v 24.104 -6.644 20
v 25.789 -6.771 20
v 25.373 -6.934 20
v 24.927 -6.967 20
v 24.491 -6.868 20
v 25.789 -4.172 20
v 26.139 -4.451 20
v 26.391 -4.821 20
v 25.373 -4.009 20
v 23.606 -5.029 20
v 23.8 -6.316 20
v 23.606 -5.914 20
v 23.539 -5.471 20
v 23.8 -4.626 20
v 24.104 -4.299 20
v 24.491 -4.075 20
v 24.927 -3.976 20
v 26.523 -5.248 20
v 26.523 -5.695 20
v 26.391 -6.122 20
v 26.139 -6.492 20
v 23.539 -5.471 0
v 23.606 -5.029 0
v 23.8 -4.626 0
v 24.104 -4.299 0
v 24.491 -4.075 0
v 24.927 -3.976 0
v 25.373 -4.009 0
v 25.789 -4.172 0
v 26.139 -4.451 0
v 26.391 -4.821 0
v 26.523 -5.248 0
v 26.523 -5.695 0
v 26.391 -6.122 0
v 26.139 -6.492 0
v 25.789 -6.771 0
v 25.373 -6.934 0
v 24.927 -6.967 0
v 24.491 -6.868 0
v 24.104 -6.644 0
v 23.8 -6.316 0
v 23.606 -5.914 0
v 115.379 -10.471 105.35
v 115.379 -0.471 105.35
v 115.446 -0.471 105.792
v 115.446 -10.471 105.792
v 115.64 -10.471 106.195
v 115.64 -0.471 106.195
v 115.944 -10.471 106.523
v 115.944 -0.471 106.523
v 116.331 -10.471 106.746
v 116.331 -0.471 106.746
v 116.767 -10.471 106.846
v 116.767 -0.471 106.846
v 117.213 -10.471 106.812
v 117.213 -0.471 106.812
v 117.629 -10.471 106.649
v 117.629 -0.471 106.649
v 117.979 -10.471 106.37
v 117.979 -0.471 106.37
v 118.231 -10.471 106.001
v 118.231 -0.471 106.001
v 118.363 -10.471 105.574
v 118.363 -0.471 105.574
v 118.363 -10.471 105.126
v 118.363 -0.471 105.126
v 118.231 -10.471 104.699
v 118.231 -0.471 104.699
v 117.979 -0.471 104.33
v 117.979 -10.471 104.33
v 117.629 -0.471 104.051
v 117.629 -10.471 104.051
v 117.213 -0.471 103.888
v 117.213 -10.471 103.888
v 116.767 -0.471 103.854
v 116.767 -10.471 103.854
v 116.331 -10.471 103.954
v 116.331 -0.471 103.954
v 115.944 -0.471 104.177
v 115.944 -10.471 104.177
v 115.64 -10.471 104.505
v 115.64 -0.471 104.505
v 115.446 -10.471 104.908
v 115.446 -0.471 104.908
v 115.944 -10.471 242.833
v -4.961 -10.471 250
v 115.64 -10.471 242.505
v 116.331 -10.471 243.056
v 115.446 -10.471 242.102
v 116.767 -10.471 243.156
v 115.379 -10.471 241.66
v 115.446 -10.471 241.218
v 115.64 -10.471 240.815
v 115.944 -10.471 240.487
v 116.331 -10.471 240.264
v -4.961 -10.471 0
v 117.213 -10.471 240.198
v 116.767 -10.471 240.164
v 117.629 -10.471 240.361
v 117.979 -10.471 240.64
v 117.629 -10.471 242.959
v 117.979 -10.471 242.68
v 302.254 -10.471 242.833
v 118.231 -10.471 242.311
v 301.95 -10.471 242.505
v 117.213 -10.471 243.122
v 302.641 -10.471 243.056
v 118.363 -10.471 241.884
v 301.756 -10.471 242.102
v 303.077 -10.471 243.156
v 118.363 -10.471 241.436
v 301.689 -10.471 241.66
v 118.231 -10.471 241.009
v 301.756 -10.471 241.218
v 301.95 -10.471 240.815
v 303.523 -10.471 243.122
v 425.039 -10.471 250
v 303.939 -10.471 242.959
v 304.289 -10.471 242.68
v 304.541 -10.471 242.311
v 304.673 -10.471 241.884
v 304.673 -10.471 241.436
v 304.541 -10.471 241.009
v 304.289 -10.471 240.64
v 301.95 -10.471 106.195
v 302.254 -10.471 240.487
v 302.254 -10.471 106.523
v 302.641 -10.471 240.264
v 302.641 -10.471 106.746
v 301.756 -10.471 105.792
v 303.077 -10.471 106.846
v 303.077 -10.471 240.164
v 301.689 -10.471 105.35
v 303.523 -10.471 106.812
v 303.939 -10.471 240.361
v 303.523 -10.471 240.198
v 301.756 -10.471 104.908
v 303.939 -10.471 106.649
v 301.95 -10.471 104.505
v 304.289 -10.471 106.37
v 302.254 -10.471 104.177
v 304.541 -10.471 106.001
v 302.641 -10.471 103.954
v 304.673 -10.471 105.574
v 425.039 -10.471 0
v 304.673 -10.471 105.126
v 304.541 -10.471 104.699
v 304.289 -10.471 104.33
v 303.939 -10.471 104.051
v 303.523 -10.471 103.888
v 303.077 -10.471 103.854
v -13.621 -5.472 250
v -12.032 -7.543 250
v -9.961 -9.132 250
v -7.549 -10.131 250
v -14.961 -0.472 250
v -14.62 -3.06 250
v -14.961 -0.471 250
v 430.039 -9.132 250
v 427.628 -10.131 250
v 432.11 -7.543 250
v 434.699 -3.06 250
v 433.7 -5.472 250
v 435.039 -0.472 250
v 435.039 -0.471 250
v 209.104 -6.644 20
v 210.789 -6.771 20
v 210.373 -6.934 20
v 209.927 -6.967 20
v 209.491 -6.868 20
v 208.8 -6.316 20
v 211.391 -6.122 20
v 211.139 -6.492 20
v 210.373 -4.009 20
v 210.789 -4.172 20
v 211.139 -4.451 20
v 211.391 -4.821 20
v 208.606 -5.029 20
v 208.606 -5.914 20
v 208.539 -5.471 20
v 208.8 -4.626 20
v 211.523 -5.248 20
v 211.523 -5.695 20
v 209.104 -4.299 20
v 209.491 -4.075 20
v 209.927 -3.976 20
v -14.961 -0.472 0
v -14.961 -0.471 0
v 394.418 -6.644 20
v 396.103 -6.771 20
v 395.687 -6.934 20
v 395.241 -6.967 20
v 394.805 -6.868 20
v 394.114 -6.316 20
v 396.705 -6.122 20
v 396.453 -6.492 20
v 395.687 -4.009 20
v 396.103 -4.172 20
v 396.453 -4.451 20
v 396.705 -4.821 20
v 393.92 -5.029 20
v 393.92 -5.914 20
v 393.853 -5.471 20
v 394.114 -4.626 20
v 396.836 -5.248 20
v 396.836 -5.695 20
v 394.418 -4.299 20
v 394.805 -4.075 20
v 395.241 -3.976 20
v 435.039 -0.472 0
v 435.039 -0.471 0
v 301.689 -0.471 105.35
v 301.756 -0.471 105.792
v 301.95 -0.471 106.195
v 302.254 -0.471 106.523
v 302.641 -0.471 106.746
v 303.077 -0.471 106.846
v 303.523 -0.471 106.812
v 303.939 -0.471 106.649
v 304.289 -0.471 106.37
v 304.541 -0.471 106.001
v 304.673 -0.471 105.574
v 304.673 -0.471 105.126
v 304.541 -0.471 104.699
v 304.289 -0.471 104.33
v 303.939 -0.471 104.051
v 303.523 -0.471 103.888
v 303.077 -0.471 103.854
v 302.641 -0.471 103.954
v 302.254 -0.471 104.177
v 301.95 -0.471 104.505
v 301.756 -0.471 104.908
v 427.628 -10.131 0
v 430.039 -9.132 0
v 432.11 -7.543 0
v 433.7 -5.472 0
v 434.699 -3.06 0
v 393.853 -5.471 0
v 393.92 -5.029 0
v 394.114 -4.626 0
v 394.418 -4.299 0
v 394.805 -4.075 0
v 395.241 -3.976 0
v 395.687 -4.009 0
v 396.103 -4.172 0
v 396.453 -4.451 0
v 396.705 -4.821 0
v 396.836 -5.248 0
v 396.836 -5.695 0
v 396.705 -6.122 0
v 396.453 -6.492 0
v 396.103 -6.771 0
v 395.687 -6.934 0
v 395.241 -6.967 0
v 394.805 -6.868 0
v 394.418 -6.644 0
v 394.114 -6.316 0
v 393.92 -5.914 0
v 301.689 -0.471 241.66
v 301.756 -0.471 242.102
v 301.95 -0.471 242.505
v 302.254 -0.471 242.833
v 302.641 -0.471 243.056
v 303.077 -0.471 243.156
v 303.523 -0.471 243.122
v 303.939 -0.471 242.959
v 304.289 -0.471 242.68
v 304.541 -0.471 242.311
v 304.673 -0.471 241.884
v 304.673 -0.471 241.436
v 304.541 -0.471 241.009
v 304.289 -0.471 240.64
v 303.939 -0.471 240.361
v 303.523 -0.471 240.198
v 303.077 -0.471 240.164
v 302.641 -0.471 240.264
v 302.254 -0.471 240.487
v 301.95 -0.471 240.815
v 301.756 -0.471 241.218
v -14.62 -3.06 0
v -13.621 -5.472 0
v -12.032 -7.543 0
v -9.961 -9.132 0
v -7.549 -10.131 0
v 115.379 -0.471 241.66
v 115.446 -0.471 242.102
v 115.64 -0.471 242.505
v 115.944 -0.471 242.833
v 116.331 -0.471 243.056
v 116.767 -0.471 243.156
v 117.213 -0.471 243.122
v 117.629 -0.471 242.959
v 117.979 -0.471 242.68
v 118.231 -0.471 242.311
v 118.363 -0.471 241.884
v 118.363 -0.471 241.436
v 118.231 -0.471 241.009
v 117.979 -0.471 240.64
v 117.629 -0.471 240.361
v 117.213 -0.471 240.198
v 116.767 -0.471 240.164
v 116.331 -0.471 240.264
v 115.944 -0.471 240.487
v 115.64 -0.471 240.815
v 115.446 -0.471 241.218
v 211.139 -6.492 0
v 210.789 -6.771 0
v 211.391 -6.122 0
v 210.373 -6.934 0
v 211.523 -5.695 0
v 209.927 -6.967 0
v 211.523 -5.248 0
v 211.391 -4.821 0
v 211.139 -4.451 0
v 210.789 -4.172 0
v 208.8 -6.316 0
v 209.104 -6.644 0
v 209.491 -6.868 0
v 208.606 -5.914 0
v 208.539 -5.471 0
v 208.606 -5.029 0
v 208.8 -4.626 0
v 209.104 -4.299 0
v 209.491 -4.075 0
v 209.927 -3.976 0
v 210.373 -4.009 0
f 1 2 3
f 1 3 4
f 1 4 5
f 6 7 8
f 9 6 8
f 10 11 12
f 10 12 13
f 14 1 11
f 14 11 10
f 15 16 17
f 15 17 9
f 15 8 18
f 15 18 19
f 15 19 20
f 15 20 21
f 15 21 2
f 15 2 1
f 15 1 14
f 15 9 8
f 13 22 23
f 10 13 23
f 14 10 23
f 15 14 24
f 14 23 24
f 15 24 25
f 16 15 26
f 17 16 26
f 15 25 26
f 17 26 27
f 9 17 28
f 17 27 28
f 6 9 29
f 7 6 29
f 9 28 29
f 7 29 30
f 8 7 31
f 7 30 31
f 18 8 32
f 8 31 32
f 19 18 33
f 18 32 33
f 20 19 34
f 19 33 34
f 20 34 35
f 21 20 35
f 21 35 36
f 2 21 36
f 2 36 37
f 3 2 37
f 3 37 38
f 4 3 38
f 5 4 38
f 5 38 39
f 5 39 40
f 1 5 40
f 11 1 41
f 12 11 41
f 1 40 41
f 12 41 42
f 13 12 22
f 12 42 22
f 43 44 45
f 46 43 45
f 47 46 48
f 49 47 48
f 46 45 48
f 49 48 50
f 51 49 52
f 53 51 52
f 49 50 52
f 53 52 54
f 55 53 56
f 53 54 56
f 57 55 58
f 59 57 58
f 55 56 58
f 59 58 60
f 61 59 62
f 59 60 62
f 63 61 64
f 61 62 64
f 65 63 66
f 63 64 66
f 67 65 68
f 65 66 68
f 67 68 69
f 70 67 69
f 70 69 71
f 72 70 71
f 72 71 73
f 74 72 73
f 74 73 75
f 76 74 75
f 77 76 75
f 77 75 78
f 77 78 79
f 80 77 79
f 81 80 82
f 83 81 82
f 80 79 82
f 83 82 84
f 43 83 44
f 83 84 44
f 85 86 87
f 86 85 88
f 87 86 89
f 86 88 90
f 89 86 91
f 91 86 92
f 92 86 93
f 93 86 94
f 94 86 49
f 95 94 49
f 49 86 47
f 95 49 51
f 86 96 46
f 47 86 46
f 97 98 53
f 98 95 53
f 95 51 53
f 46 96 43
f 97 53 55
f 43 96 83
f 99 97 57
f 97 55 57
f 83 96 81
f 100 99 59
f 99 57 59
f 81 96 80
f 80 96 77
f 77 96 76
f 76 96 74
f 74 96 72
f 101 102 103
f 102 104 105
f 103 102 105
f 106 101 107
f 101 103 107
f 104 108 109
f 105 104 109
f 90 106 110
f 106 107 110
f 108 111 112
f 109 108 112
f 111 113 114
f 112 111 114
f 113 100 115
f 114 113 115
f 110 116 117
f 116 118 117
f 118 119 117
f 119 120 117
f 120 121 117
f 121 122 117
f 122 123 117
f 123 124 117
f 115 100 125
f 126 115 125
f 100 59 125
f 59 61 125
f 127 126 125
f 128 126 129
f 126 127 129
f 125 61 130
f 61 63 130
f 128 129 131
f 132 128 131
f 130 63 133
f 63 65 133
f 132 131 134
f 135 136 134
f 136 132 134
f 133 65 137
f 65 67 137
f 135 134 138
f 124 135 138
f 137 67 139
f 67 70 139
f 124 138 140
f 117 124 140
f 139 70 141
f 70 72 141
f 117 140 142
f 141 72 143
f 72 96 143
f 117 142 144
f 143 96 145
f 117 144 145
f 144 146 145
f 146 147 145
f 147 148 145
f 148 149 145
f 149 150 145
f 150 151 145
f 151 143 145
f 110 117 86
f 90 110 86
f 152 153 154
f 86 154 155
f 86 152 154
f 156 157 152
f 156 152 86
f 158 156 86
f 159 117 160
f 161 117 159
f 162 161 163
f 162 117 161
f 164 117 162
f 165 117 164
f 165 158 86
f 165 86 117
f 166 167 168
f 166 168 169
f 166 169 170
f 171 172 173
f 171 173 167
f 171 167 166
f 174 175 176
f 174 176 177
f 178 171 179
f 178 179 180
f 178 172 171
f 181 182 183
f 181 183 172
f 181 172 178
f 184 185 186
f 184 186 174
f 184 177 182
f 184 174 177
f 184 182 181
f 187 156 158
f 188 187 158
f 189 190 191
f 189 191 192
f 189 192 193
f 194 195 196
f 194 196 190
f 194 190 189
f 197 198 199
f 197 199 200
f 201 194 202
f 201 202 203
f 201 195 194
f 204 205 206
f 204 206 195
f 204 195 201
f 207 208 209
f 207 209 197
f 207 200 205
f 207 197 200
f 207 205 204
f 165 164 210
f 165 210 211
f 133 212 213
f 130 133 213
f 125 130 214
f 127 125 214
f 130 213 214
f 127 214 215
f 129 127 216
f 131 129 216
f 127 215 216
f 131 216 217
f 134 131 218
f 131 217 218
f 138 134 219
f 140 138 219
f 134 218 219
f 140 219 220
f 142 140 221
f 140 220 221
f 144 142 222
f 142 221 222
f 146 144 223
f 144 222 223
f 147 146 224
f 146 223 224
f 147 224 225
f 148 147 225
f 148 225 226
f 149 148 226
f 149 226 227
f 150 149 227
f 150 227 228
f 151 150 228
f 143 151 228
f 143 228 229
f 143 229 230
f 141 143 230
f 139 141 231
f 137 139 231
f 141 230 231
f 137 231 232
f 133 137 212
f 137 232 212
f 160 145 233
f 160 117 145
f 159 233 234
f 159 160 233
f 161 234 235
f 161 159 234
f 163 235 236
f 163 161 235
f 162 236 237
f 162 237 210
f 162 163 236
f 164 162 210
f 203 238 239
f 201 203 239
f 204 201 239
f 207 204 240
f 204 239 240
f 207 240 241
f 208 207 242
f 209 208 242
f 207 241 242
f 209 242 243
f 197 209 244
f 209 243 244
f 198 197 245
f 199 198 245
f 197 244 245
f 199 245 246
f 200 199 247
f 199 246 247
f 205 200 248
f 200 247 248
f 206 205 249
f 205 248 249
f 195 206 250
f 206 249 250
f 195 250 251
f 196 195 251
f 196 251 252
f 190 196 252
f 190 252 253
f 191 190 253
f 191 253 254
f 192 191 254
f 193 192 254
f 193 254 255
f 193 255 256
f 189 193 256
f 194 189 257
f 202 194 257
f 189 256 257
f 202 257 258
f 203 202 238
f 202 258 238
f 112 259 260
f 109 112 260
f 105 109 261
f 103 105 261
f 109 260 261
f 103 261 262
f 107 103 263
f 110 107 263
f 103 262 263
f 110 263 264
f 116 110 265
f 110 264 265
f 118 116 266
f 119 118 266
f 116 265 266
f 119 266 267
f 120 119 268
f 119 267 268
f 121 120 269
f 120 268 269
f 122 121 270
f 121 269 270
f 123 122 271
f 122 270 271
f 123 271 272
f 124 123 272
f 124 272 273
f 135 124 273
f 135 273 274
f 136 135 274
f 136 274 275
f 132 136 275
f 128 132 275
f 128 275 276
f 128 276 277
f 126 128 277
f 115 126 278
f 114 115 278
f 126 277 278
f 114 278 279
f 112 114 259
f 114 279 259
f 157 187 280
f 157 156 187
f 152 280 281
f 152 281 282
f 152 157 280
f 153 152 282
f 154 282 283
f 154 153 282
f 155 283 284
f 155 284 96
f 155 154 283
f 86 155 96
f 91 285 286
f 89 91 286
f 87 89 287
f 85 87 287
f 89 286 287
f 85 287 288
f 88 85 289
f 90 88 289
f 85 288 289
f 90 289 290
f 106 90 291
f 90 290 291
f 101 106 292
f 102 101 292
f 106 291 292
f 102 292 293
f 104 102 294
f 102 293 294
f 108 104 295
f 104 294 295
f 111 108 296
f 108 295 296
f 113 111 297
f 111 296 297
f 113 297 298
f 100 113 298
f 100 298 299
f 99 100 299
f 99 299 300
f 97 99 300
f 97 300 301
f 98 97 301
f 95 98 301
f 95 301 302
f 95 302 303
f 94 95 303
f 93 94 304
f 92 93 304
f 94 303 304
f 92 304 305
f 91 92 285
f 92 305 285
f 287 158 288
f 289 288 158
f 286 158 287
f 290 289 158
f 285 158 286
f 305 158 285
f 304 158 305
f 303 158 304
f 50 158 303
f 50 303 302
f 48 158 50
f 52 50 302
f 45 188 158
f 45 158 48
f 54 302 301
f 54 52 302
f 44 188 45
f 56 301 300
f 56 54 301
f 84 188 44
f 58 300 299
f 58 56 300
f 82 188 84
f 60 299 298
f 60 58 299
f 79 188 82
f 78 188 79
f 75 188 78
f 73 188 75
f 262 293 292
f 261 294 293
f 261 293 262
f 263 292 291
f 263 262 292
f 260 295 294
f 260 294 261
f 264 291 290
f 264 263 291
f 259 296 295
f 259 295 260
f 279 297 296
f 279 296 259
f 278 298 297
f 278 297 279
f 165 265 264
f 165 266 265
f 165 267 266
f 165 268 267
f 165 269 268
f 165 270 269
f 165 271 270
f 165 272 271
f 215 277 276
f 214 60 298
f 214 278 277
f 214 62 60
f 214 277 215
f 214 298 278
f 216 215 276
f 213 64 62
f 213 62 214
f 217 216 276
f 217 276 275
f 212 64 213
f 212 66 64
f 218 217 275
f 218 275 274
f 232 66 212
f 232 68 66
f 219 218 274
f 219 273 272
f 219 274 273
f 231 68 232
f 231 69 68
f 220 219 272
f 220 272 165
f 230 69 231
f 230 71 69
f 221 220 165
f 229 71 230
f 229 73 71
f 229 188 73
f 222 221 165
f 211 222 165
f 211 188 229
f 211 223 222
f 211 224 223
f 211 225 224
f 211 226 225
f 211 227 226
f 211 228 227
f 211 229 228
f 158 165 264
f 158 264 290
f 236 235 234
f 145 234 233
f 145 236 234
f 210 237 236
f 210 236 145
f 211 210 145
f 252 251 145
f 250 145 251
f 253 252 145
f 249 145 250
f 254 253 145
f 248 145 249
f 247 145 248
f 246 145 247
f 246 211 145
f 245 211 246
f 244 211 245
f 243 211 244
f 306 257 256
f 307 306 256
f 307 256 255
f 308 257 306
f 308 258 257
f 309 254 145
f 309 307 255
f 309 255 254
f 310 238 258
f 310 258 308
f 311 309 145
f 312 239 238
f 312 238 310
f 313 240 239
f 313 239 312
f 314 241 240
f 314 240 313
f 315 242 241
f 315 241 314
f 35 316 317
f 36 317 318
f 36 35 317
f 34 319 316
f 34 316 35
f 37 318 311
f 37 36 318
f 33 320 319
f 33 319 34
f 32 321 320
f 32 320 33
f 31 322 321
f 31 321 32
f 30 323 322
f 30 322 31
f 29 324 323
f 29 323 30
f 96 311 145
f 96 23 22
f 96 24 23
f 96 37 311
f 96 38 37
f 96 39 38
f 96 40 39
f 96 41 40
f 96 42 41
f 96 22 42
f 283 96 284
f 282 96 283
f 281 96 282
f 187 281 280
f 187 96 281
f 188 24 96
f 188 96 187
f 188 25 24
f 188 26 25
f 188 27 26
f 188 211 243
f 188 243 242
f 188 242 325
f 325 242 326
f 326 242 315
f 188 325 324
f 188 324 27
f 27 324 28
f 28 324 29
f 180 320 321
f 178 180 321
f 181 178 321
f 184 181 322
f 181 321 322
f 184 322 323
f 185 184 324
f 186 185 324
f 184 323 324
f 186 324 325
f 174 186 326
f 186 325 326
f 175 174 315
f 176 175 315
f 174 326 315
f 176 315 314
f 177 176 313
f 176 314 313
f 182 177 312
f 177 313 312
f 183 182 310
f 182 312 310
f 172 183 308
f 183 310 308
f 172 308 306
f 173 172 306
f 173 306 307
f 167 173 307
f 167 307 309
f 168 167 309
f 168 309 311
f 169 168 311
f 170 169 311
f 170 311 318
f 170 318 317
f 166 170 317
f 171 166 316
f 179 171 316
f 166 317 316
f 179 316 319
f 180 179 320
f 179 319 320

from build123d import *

# Parameters (mm, degrees)
SKETCH1_W           = 450
SKETCH1_H           = 10
BOSS_EXTRUDE2_DEPTH = 250
SKETCH2_R           = 3
CUT_EXTRUDE1_DEPTH  = 20
FILLET1_R           = 10
FILLET2_R           = 10
SKETCH4_R           = 1.5
CUT_EXTRUDE3_DEPTH  = 10
SKETCH5_R           = 3
BOSS_EXTRUDE3_DEPTH = 61
SKETCH6_R           = 1.5
CUT_EXTRUDE4_DEPTH  = 20


with BuildPart() as part:
    # Sketch1 → Boss-Extrude2 (new body)
    with BuildSketch(Plane.XY):
        with Locations((210.039371405, -5.47146824)):
            Rectangle(SKETCH1_W, SKETCH1_H)
    extrude(amount=BOSS_EXTRUDE2_DEPTH)

    # Sketch2 → Cut-Extrude1 (cut)
    with BuildSketch(Plane(origin=(0, 0, 0), x_dir=(-1, 0, 0), z_dir=(0, 0, -1))):
        with Locations((-25.039371405, -5.47146824)):
            Circle(SKETCH2_R)
        with Locations((-210.039371405, -5.47146824)):
            Circle(SKETCH2_R)
        with Locations((-395.039371405, -5.47146824)):
            Circle(SKETCH2_R)
    extrude(amount=-CUT_EXTRUDE1_DEPTH, mode=Mode.SUBTRACT)

    # Fillet1
    fillet1_edges = [part.edges().sort_by_distance(p)[0] for p in [
        (-14.960628595, -10.47146824, 125),
    ]]
    fillet(fillet1_edges, radius=FILLET1_R - 0.0001)  # a hair under: the kernel refuses the full size

    # Fillet2
    fillet2_edges = [part.edges().sort_by_distance(p)[0] for p in [
        (435.039371405, -10.47146824, 125),
    ]]
    fillet(fillet2_edges, radius=FILLET2_R - 0.0001)  # a hair under: the kernel refuses the full size

    # Sketch4 → Cut-Extrude3 (cut)
    with BuildSketch(Plane(origin=(0, -0.47146824, 0), x_dir=(1, 0, 0), z_dir=(0, 1, 0))):
        with Locations(Location((303.189371405, -241.66, 0), (0, 0, 180))):
            Circle(SKETCH4_R)
        with Locations(Location((116.879371405, -241.66, 0), (0, 0, 180))):
            Circle(SKETCH4_R)
        with Locations(Location((116.879371405, -105.35, 0), (0, 0, 180))):
            Circle(SKETCH4_R)
        with Locations(Location((303.189371405, -105.35, 0), (0, 0, 180))):
            Circle(SKETCH4_R)
    extrude(amount=-CUT_EXTRUDE3_DEPTH, mode=Mode.SUBTRACT)

    # Sketch5 → Boss-Extrude3 (add)
    with BuildSketch(Plane(origin=(0, 0, 0), x_dir=(-1, 0, 0), z_dir=(0, 0, -1))):
        with Locations((-395.039371405, -5.47146824)):
            Circle(SKETCH5_R)
        with Locations((-210.039371405, -5.47146824)):
            Circle(SKETCH5_R)
        with Locations((-25.039371405, -5.47146824)):
            Circle(SKETCH5_R)
    extrude(amount=-BOSS_EXTRUDE3_DEPTH)

    # Sketch6 → Cut-Extrude4 (cut)
    with BuildSketch(Plane(origin=(0, 0, 0), x_dir=(-1, 0, 0), z_dir=(0, 0, -1))):
        with Locations((-395.353101739, -5.47146824)):
            Circle(SKETCH6_R)
        with Locations((-210.039371405, -5.47146824)):
            Circle(SKETCH6_R)
        with Locations((-25.039371405, -5.47146824)):
            Circle(SKETCH6_R)
    extrude(amount=-CUT_EXTRUDE4_DEPTH, mode=Mode.SUBTRACT)


solid = part.part
